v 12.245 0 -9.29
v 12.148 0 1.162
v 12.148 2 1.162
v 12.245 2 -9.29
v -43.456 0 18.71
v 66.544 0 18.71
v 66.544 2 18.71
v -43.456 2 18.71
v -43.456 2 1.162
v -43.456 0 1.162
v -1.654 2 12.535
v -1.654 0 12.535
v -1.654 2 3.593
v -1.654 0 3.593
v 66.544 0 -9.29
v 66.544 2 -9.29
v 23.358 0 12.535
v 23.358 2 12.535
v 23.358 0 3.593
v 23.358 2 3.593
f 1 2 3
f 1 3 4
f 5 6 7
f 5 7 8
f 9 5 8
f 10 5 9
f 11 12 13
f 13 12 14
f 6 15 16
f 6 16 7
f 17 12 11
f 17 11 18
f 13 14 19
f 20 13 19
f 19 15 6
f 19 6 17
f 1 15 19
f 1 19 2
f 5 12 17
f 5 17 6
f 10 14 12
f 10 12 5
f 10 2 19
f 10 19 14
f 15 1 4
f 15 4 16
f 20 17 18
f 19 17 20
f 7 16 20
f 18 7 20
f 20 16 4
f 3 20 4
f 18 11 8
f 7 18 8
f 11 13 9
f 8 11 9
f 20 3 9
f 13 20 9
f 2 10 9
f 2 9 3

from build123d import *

# Parameters (mm, degrees)
SKETCH1_W           = 25.012643909
SKETCH1_H           = 8.941938647
BOSS_EXTRUDE1_DEPTH = 2


with BuildPart() as part:
    # Sketch1 → Boss-Extrude1 (new body)
    with BuildSketch(Plane(origin=(0, 0, 0), x_dir=(1, 0, 0), z_dir=(0, 1, 0))):
        Polygon((12.244705421, 9.289945609), (66.543678684, 9.289945609), (66.543678684, -18.710054391), (-43.456321316, -18.710054391), (-43.456321316, -1.162360163), (12.148339373, -1.162360163), align=None)
        with Locations((10.851931882, -8.063685007)):
            Rectangle(SKETCH1_W, SKETCH1_H, mode=Mode.SUBTRACT)
    extrude(amount=BOSS_EXTRUDE1_DEPTH)


solid = part.part
